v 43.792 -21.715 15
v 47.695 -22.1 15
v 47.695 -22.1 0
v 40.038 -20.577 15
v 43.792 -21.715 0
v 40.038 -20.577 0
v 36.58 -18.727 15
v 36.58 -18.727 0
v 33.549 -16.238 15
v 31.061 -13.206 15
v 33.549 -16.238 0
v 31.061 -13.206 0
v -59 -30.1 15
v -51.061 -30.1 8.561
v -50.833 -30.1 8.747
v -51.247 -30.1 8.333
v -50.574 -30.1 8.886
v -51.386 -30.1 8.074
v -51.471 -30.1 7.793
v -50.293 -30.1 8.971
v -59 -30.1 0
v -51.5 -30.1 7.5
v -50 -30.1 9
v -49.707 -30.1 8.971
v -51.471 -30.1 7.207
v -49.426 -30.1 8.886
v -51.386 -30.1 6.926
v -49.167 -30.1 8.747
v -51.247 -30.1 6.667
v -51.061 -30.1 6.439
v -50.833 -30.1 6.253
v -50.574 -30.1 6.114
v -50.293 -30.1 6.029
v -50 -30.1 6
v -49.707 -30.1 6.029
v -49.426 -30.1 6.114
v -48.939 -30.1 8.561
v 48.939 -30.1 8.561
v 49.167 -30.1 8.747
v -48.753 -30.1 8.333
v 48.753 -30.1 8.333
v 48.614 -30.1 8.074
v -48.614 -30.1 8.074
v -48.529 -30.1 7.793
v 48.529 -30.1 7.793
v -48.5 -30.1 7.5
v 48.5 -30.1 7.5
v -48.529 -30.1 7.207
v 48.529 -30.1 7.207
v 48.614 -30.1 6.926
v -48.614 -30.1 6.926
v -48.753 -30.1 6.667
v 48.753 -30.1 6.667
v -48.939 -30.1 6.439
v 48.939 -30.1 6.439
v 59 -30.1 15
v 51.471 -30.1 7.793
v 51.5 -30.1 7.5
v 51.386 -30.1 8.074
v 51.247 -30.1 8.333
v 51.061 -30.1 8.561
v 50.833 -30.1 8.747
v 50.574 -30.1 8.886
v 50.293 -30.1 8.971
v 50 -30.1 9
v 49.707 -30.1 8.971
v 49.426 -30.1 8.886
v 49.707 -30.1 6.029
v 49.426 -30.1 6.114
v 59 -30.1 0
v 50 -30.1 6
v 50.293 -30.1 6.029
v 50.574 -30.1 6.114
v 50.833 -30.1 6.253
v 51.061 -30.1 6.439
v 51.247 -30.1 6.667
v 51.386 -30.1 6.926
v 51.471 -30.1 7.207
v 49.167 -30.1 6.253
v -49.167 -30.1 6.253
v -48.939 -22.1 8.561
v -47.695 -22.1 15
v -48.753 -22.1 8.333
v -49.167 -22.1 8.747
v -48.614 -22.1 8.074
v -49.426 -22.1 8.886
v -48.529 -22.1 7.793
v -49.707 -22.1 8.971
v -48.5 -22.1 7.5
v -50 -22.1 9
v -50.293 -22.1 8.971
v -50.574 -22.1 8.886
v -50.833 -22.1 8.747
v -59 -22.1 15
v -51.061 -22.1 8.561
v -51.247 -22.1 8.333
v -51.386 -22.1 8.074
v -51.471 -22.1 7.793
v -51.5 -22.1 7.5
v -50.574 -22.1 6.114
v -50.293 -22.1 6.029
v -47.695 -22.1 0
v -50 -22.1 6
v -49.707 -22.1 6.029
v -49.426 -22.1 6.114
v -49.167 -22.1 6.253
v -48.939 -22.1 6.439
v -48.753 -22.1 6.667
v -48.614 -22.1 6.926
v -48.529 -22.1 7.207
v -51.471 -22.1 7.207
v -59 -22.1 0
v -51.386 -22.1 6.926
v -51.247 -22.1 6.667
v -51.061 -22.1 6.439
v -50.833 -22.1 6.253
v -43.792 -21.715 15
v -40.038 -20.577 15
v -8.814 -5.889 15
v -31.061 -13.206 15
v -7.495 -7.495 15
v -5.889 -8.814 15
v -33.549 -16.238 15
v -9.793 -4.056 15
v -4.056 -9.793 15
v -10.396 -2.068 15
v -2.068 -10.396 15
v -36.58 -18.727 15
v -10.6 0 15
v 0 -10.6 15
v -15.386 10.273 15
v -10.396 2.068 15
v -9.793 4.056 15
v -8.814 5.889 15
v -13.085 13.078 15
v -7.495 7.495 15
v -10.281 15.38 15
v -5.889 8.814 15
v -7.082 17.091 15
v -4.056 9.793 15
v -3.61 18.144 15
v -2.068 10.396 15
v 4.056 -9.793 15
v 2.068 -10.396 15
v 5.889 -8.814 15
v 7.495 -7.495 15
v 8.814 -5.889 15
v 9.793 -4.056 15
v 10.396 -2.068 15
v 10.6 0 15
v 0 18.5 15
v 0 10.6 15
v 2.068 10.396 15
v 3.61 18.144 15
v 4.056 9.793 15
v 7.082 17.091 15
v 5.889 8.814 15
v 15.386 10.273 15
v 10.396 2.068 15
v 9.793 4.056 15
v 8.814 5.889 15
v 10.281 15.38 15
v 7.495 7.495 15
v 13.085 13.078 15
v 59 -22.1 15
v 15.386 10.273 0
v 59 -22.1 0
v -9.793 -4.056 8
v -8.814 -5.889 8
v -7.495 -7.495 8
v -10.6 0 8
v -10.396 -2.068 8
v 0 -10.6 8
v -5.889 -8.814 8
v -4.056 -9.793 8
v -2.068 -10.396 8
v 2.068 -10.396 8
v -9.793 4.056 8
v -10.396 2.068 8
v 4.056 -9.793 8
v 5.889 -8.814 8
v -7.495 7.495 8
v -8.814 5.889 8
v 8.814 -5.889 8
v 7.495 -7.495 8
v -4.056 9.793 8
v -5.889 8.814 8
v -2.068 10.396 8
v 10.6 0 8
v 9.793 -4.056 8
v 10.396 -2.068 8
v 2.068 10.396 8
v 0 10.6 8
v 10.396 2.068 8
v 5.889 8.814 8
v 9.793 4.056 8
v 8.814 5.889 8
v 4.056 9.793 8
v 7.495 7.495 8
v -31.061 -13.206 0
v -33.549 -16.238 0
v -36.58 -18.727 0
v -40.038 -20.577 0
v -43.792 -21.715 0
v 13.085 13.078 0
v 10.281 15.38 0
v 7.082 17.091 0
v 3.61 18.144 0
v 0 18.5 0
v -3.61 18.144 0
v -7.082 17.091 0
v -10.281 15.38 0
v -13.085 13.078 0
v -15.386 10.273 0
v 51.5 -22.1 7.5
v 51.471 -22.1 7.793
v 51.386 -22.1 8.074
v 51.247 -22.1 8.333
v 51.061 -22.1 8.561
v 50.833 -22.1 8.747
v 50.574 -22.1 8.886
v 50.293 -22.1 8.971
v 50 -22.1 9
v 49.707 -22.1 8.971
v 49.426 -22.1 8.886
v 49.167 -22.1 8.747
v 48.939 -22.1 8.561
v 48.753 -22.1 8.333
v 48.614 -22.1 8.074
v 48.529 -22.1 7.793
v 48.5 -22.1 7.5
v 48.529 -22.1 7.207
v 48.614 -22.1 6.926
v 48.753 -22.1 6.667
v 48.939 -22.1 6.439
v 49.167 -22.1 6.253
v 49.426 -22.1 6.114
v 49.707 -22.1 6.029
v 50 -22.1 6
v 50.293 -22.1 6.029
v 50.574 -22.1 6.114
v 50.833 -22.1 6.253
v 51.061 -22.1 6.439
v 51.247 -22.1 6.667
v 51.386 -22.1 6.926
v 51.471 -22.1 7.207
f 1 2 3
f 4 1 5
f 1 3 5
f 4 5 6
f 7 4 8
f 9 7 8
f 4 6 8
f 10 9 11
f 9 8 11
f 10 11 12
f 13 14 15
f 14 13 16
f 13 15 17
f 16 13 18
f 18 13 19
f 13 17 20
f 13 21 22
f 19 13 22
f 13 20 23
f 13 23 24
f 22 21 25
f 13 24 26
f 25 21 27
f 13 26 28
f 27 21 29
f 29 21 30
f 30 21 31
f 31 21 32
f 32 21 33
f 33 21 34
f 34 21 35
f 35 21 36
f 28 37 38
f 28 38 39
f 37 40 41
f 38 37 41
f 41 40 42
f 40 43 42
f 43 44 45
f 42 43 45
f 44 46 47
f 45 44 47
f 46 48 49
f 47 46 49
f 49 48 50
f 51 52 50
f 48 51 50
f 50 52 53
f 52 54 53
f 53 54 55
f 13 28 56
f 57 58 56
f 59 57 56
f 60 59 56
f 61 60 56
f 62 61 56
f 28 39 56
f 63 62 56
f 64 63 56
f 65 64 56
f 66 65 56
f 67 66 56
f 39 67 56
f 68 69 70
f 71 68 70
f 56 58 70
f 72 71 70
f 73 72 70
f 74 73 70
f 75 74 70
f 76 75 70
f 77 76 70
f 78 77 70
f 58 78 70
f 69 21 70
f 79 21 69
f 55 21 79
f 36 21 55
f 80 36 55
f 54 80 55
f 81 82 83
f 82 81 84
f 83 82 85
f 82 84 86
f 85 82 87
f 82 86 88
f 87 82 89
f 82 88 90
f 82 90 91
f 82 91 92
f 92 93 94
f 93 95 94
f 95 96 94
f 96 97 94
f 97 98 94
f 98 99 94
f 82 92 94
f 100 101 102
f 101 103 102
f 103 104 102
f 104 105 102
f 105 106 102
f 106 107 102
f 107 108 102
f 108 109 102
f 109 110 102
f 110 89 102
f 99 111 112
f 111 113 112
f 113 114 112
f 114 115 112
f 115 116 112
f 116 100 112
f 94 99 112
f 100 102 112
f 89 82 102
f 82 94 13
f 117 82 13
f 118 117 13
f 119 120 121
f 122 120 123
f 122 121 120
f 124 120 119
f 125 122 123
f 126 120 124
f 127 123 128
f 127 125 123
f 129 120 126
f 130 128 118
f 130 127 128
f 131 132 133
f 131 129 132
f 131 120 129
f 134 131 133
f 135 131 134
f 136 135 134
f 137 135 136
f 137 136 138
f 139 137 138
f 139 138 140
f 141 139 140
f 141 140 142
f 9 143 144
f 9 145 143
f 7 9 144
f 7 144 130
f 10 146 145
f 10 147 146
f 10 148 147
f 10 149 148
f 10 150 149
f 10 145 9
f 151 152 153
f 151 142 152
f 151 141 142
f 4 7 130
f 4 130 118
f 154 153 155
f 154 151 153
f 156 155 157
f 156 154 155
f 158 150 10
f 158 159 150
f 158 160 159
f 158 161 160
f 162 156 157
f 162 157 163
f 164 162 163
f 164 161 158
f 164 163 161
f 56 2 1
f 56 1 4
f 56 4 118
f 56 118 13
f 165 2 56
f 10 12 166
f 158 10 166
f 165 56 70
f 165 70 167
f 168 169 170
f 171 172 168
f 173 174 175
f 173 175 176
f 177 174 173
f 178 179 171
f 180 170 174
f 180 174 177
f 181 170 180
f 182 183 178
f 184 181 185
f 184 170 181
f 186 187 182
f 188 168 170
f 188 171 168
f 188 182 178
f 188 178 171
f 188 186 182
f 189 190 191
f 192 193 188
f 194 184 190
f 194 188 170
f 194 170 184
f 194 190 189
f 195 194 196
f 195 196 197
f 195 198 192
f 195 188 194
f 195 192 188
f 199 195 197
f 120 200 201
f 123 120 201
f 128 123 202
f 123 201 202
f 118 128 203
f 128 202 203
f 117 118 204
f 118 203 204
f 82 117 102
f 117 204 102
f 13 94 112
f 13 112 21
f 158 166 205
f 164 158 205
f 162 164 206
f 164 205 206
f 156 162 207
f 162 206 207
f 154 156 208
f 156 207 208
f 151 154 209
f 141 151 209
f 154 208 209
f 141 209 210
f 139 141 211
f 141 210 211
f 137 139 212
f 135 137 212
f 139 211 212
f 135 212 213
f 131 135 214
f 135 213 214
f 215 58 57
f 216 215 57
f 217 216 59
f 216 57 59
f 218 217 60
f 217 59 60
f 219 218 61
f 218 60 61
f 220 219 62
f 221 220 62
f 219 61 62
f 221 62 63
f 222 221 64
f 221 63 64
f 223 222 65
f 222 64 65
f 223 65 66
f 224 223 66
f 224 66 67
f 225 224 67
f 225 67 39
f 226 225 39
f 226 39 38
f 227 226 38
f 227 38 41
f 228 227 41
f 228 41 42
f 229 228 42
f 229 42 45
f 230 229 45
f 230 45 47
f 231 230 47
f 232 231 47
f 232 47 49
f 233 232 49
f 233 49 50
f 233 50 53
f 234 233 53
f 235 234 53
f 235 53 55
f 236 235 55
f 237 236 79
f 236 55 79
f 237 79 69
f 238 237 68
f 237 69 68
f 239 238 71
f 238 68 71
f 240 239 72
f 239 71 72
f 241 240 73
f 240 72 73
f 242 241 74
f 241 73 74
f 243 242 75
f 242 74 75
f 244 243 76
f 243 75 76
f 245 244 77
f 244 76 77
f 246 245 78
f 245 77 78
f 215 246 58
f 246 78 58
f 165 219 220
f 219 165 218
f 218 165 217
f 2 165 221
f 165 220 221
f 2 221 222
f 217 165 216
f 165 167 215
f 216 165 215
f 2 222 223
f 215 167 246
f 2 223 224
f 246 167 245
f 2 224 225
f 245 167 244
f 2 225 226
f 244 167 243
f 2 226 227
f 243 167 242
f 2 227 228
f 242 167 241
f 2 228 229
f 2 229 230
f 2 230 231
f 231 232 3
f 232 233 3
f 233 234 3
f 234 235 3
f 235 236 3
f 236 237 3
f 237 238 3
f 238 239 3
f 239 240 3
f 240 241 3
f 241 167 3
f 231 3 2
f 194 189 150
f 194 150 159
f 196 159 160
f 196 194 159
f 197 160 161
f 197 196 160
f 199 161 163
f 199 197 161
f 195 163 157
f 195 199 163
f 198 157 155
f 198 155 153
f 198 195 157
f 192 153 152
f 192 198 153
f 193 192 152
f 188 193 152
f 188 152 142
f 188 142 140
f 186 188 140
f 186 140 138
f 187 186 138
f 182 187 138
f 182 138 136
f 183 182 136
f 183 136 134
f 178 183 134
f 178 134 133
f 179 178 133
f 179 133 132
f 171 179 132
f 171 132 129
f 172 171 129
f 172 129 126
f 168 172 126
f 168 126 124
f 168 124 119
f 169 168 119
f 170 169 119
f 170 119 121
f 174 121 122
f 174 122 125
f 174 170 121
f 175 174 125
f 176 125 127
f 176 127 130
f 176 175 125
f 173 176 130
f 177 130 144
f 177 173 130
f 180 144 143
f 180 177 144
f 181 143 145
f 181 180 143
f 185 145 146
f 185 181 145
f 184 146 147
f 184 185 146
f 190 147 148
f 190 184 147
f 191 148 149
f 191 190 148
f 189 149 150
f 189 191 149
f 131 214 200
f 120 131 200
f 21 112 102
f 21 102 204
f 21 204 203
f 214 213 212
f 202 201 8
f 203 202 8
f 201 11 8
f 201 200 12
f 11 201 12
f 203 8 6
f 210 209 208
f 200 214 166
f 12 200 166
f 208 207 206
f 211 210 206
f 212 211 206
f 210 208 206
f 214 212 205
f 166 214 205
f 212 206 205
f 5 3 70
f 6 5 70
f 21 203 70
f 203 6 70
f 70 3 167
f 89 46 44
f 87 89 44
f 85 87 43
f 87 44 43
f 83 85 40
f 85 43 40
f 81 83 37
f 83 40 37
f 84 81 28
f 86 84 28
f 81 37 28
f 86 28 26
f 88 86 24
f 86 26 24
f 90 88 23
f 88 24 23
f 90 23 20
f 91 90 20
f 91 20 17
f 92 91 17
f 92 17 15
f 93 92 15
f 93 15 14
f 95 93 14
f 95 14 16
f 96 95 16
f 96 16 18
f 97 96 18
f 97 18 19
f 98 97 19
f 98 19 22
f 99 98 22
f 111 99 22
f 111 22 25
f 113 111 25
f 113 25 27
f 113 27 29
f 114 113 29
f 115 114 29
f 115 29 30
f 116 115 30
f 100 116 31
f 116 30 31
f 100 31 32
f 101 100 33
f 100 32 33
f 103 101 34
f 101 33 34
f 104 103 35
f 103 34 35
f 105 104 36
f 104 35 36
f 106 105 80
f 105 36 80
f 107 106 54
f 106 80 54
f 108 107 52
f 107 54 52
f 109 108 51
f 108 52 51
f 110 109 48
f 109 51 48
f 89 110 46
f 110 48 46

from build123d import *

# Parameters (mm, degrees)
SKETCH4_R           = 10.6
BOSS_EXTRUDE3_DEPTH = 15
SKETCH5_R           = 1.5
CUT_EXTRUDE2_DEPTH  = 15
SKETCH4_2_R         = 10.6
BOSS_EXTRUDE4_DEPTH = 8


with BuildPart() as part:
    # Sketch4 → Boss-Extrude3 (new body)
    with BuildSketch(Plane.XY):
        with BuildLine():
            Line((-59, -30.1), (59, -30.1))
            Line((59, -30.1), (59, -22.100006907))
            Line((59, -22.100006907), (47.694750419, -22.100006907))
            ThreePointArc((47.694750419, -22.100006907), (38.263703272, -19.736768223), (31.061437671, -13.20554188))
            Line((31.061437671, -13.20554188), (15.385814292, 10.27261985))
            ThreePointArc((15.385814292, 10.27261985), (0, 18.5), (-15.385814292, 10.27261985))
            Line((-15.385814292, 10.27261985), (-31.061437671, -13.20554188))
            ThreePointArc((-31.061437671, -13.20554188), (-38.263703272, -19.736768223), (-47.694750419, -22.100006907))
            Line((-47.694750419, -22.100006907), (-59, -22.100006907))
            Line((-59, -22.100006907), (-59, -30.1))
        make_face()
        Circle(SKETCH4_R, mode=Mode.SUBTRACT)
    extrude(amount=BOSS_EXTRUDE3_DEPTH)

    # Sketch5 → Cut-Extrude2 (cut)
    with BuildSketch(Plane.XZ.offset(30.1)):
        with Locations((50, 7.5)):
            Circle(SKETCH5_R)
        with Locations((-50, 7.5)):
            Circle(SKETCH5_R)
    extrude(amount=-CUT_EXTRUDE2_DEPTH, mode=Mode.SUBTRACT)

    # Sketch4<2> → Boss-Extrude4 (add)
    with BuildSketch(Plane.XY):
        Circle(SKETCH4_2_R)
    extrude(amount=BOSS_EXTRUDE4_DEPTH)


solid = part.part
